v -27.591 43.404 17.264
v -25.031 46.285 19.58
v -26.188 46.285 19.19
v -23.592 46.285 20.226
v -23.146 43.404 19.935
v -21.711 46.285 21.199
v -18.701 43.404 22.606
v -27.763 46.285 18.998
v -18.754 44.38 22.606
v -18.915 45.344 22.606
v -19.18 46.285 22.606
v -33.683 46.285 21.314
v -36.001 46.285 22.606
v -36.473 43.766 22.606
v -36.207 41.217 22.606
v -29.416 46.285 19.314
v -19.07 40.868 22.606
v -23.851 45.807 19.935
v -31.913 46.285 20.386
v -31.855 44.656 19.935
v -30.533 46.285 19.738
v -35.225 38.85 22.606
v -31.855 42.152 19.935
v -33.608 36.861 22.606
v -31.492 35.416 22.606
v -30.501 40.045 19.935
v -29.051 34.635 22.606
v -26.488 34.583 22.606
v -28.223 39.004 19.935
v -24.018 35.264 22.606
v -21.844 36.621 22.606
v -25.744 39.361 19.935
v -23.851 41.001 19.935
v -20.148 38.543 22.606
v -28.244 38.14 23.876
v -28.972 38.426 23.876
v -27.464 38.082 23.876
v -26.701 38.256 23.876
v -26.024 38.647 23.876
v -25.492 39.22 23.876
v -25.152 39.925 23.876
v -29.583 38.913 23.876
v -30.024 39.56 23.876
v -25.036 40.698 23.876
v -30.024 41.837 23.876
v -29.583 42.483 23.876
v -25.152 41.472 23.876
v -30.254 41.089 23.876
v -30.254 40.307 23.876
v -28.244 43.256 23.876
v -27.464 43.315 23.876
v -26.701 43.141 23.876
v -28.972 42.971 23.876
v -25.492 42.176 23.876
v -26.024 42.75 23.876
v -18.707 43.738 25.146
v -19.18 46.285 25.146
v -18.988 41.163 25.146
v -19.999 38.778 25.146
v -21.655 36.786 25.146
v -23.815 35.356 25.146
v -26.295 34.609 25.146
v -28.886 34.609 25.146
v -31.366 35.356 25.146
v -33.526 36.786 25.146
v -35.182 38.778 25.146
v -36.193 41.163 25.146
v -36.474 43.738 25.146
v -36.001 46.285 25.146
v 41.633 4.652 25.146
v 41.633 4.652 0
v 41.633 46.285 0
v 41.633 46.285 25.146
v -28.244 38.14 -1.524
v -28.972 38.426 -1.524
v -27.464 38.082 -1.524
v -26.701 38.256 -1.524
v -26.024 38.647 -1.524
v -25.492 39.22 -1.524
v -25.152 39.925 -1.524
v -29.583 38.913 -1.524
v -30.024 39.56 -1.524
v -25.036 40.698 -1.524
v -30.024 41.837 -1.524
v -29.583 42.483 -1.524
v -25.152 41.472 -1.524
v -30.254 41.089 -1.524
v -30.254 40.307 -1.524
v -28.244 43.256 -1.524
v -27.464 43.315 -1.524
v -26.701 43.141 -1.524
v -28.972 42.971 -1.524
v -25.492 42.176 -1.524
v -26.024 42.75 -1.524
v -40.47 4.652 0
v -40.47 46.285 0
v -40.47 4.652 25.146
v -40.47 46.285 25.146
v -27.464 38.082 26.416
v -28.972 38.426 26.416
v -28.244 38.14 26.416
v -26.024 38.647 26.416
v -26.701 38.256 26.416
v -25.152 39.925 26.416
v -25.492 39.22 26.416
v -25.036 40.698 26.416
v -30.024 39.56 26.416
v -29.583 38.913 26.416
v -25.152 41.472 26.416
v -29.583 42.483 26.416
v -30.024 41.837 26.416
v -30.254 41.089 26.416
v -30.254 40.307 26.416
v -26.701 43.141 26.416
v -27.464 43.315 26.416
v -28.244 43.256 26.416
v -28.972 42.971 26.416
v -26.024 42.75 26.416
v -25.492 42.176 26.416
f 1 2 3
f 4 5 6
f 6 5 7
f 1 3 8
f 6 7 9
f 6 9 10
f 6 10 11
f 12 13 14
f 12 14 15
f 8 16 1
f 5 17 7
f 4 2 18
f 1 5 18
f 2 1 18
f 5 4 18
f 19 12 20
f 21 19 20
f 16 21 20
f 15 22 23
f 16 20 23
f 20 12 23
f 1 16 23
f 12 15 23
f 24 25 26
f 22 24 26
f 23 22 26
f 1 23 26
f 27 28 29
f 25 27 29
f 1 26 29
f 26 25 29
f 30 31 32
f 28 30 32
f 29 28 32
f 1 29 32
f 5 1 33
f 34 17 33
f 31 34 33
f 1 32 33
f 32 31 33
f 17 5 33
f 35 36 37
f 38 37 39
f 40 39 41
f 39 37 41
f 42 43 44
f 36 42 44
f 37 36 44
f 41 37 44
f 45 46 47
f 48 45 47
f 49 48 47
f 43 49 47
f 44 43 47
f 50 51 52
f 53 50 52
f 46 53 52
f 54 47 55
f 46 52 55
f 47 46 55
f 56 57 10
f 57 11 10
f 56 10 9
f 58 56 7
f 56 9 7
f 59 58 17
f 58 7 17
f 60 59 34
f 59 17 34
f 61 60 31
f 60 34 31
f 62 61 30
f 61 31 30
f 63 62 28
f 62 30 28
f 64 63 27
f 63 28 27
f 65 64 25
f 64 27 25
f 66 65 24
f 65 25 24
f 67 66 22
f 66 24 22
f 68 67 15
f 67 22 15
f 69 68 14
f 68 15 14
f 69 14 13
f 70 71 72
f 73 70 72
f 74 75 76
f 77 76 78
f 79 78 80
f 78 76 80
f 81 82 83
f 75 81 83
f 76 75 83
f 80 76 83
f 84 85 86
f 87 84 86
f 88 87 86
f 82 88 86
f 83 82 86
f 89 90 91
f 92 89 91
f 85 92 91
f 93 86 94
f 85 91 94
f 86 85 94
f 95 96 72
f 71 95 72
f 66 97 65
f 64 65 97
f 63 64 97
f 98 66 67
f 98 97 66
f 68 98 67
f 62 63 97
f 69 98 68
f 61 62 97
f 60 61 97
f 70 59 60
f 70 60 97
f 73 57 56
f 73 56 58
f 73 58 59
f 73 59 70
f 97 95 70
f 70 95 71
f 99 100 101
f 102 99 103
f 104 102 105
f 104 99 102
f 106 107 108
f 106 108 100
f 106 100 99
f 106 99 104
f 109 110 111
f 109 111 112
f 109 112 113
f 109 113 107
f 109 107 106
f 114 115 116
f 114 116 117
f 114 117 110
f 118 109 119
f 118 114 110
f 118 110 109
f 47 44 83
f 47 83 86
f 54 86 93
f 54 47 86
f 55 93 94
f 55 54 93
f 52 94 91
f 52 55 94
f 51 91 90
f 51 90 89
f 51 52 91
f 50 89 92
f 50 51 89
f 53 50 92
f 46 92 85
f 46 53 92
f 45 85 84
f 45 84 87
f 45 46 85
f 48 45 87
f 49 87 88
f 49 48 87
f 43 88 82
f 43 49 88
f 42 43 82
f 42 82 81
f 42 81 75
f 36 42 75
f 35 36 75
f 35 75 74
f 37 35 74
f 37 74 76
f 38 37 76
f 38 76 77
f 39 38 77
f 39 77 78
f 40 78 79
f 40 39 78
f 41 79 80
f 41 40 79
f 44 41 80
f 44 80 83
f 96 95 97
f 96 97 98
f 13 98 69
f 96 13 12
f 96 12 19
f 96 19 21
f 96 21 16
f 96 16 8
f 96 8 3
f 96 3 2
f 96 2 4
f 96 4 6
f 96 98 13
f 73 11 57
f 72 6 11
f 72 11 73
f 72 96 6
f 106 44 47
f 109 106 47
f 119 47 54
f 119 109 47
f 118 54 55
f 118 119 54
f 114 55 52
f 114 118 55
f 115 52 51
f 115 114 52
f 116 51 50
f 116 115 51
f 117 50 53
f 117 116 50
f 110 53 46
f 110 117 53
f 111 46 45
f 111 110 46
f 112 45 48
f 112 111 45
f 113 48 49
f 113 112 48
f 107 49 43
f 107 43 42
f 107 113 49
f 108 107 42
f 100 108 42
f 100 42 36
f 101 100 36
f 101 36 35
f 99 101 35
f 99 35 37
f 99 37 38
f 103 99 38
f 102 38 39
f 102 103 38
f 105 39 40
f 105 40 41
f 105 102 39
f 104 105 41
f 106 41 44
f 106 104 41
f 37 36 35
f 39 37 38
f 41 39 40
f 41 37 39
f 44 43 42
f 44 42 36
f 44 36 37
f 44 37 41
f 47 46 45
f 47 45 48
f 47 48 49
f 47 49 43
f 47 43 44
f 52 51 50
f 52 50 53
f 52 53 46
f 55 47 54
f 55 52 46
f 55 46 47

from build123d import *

# Parameters (mm, degrees)
F0_W     = 82.1032859385
F0_H     = 41.6331100278
F1_DEPTH = 25.146
F3_D     = 17.78
F3_DEPTH = 2.54
F3_TIP   = 5.3416509032
F2_R     = 2.624003914
F4_DEPTH = 1.27
F5_DEPTH = 25.4


with BuildPart() as f1:
    # F0 (on Top) → F1 (new body)
    with BuildSketch(Plane.XY):
        with Locations((0.5814675242, 25.4682993982)):
            Rectangle(F0_W, F0_H)
    extrude(amount=F1_DEPTH)

    # F3
    with Locations(Plane.XY.offset(25.146)):
        with Locations((-27.5905281305, 43.4041881504)):
            Hole(F3_D / 2, depth=F3_DEPTH)
            with Locations((0, 0, -(F3_DEPTH + F3_TIP / 2))):  # 118° drill point
                Cone(0, F3_D / 2, F3_TIP, mode=Mode.SUBTRACT)


with BuildPart() as f4:
    # F2 (on face) → F4 (new body, symmetric)
    with BuildSketch(Plane.XY.offset(25.146)):
        with Locations((-27.6596769691, 40.6982563436)):
            Circle(F2_R)
    extrude(amount=F4_DEPTH, both=True)


with BuildPart() as f5:
    # F5 (new): a face of the model
    f5_faces = [f4.part.faces().sort_by_distance(p)[0] for p in [
        (-27.6596769691, 40.6982563436, 23.876),
    ]]
    extrude(f5_faces, amount=F5_DEPTH)


solid = Compound([f1.part, f4.part, f5.part])
